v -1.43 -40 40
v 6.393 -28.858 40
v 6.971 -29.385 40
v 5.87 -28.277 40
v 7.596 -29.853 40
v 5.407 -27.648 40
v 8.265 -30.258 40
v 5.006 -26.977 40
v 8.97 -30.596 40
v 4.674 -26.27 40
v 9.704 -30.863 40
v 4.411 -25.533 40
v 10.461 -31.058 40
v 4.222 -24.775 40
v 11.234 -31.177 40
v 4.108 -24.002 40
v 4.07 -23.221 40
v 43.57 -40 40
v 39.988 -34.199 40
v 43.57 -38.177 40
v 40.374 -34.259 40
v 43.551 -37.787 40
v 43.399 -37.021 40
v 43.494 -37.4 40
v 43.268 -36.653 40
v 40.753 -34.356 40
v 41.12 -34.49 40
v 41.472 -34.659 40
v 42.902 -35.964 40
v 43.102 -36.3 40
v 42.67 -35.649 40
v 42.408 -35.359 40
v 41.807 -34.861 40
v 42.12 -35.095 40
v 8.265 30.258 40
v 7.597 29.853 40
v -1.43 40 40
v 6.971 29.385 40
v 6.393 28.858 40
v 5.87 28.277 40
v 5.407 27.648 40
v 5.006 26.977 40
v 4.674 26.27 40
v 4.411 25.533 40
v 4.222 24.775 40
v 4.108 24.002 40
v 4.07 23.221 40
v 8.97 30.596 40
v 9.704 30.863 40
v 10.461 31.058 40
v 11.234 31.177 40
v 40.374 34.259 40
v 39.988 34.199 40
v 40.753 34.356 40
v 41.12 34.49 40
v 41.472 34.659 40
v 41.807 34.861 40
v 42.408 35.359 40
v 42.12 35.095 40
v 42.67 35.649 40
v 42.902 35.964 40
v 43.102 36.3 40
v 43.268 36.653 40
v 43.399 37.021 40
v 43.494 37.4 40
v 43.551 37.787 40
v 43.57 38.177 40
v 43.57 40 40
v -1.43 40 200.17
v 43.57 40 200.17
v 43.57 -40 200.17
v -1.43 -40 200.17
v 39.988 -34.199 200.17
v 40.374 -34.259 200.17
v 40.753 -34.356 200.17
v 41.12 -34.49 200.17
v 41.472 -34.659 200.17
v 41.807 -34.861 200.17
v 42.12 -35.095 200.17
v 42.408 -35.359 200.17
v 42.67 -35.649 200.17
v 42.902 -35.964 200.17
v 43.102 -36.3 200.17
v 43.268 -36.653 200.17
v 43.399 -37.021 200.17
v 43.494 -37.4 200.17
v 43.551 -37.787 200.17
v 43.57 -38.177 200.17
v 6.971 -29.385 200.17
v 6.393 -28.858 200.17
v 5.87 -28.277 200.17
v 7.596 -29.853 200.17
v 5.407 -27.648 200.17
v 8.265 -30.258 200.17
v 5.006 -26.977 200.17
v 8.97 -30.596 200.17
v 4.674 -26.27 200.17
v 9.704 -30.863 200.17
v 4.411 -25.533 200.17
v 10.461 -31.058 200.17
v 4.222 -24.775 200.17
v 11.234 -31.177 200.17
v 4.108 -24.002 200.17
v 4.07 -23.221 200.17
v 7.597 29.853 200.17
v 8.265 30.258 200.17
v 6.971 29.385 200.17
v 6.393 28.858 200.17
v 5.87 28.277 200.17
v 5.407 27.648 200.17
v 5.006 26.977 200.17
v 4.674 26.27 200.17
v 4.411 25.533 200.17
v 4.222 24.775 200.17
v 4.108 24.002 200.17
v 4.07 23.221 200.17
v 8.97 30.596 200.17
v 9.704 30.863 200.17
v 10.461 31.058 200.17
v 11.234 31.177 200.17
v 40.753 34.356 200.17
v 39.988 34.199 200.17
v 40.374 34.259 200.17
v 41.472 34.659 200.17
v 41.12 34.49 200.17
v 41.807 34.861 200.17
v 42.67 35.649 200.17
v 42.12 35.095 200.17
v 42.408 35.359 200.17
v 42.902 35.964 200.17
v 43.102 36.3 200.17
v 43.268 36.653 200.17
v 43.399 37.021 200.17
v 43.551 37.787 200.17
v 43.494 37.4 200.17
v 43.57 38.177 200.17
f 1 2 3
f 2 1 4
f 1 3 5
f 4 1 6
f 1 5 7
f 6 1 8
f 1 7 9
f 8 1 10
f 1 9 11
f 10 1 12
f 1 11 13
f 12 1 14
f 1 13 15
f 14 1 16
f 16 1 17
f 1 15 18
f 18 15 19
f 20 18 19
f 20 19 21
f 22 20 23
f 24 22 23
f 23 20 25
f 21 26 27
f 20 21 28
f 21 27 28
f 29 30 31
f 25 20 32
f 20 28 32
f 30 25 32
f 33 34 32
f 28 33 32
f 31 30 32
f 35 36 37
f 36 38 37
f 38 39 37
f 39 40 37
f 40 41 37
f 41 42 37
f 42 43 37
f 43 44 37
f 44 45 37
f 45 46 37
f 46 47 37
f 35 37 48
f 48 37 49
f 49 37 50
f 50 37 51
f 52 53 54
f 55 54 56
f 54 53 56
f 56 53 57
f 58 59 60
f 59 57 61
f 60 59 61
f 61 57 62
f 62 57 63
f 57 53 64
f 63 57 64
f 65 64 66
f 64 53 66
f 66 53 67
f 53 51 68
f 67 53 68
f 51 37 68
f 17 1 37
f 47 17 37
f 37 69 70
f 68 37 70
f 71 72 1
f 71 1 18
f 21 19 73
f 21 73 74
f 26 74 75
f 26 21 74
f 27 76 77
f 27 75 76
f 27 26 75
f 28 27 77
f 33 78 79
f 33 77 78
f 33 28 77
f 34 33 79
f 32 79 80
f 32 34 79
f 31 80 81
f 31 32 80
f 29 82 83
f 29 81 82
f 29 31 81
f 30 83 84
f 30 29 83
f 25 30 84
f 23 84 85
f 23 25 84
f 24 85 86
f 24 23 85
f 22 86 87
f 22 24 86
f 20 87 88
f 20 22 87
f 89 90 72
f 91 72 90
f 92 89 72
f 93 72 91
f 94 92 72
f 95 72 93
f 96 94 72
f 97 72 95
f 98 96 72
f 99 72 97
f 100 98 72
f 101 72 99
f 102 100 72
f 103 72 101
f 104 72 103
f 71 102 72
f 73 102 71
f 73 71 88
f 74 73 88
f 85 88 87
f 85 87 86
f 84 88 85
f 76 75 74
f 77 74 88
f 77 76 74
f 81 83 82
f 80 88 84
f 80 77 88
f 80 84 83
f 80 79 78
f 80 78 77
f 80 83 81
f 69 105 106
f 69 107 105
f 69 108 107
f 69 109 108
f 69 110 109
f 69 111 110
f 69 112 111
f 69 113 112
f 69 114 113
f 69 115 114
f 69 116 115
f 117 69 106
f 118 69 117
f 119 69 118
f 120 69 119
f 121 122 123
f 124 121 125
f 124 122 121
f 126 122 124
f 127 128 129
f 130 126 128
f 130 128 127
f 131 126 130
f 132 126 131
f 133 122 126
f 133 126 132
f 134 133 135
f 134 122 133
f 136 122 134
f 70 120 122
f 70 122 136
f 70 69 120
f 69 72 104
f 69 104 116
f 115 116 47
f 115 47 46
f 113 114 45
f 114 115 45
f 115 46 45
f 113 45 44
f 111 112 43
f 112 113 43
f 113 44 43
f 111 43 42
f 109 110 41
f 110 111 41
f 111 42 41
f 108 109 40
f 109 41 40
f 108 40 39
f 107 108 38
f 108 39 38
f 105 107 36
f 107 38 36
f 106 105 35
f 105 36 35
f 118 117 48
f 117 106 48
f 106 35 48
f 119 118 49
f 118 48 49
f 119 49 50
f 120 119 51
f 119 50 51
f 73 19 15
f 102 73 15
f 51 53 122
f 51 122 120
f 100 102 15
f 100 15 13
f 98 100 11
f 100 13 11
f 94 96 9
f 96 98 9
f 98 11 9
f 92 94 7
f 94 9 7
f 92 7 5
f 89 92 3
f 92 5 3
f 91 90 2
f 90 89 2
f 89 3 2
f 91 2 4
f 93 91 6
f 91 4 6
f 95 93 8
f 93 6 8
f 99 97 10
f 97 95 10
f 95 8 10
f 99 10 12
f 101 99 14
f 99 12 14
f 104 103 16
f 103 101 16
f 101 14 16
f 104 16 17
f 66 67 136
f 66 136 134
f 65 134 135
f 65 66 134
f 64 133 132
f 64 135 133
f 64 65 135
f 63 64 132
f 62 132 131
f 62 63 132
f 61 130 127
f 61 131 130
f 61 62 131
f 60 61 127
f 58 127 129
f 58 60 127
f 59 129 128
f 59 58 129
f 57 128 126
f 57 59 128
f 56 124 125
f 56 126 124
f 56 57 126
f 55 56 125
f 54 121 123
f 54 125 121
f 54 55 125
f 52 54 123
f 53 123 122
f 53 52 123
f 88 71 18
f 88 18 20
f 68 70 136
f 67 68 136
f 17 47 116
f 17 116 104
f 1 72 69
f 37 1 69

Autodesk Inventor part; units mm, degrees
ref_plane "Начальная плоскость" through (0, 0, 40) normal (0, 0, 1) x (1, 0, 0)
ref_plane "Конечная плоскость" through (0, 0, 200.17) normal (0, 0, 1) x (1, 0, 0)
sketch "Эскиз" plane through (0, 0, 0) normal (0, 0, 1) x (1, 0, 0)
  line L0 (-1.43, 0) -> (-1.43, 40)
  line L1 (-1.43, 40) -> (43.57, 40)
  line L2 (43.57, 40) -> (43.57, 38.1774)
  line L3 (39.9881, 34.1993) -> (11.2338, 31.1771)
  line L4 (4.07, 23.221) -> (4.07, 0)
  line L5 (4.07, 0) -> (-1.43, 0) construction
  line L6 (23.82, 40) -> (23.82, 32.5) construction
  line L7 (43.57, 34.5758) -> (43.57, 32.5) construction
  line L8 (43.57, 32.5) -> (23.82, 32.5) construction
  line L9 (0, 15) -> (0, -27) construction
  line L10 (-5.539, 0) -> (16.0067, 0) construction
  line L11 (-1.43, 0) -> (-1.43, -40)
  line L12 (-1.43, -40) -> (43.57, -40)
  line L13 (43.57, -40) -> (43.57, -38.1774)
  line L14 (39.9881, -34.1993) -> (11.2338, -31.1771)
  line L15 (4.07, -23.221) -> (4.07, 0)
  arc A0 (11.2338, 31.1771) -> (4.07, 23.221) centre (12.07, 23.221) ccw
  arc A1 (4.07, -23.221) -> (11.2338, -31.1771) centre (12.07, -23.221) ccw
  arc A2 (39.9881, 34.1993) -> (43.57, 38.1774) centre (39.57, 38.1774) ccw
  arc A3 (43.57, -38.1774) -> (39.9881, -34.1993) centre (39.57, -38.1774) ccw
  line L16 (0, 56) -> (0, -56) construction
  line L17 (-15.5135, 0) -> (54.308, 0) construction
  point P0 (4.07, 30.4242)
  point P1 (43.57, -34.5758)
  point P2 (4.07, -30.4242)
  point P3 (23.82, -40)
  point P4 (23.82, -32.5)
  dimension "d0" = 5.5
  dimension "d1" = 40
  dimension "d2" = 45
  dimension "d3" = 7.5
  dimension "d4" = 19.75
  dimension "d5" = 2.0758
  dimension "d23" = 8
  dimension "d24" = 4
  dimension "d25" = 1.43
extrude "Тело" add sketch "Эскиз" along normal up to surface (160.17 mm away) from surface at 40
sketch "Sketch3" plane through (0, 0, 0) normal (0, 0, 1) x (1, 0, 0)
  line L0 (0, 0) -> (10, 0)
ref_plane "Work Plane3" through (0, 0, 0) normal (0, -1, 0) x (1, 0, 0)
sketch "Sketch4" plane through (0, 0, 0) normal (0, -1, 0) x (1, 0, 0)
  line L0 (-2, 40) -> (12, 40)
  line L1 (-2, 200.17) -> (12, 200.17)
  dimension "d29" = 160.17
ref_plane "РабПлоскость4" through (0, -158, 240.17) normal (0, 1, 0) x (1, 0, 0)
ref_plane "РабПлоскость5" through (0, 557.0652, 240.17) normal (0, 1, 0) x (1, 0, 0)
ref_plane "РабПлоскость6" through (0, 199.5326, 240.17) normal (0, 1, 0) x (1, 0, 0)
sketch "Эскиз5" plane through (0, 199.5326, 240.17) normal (0, 1, 0) x (1, 0, 0)
  line L0 (-1.43, 0) -> (-1.43, 40)
  line L1 (-1.43, 40) -> (43.57, 40)
  line L2 (43.57, 40) -> (43.57, 38.1774)
  arc A0 (39.9881, 34.1993) -> (43.57, 38.1774) centre (39.57, 38.1774) ccw
  line L3 (39.9881, 34.1993) -> (11.2338, 31.1771)
  arc A1 (11.2338, 31.1771) -> (4.07, 23.221) centre (12.07, 23.221) ccw
  line L4 (4.07, 23.221) -> (4.07, 0)
  line L5 (4.07, -23.221) -> (4.07, 0)
  arc A2 (4.07, -23.221) -> (11.2338, -31.1771) centre (12.07, -23.221) ccw
  line L6 (39.9881, -34.1993) -> (11.2338, -31.1771)
  arc A3 (43.57, -38.1774) -> (39.9881, -34.1993) centre (39.57, -38.1774) ccw
  line L7 (43.57, -40) -> (43.57, -38.1774)
  line L8 (-1.43, -40) -> (43.57, -40)
  line L9 (-1.43, 0) -> (-1.43, -40)
extrude "Выдавливание2" add sketch "Эскиз5" along normal up to surface (715.0652 mm away) from surface at -357.5326 separate body
feature "Комбинировать1" [suppressed]
ref_plane "РабПлоскость7" through (0, 562.5, 0) normal (0, -1, 0) x (1, 0, 0)
ref_plane "РабПлоскость8" through (0, -158, 0) normal (0, -1, 0) x (1, 0, 0)
ref_plane "РабПлоскость9" through (0, 202.25, 0) normal (0, -1, 0) x (1, 0, 0)
sketch "Эскиз6" plane through (0, 202.25, 0) normal (0, -1, 0) x (1, 0, 0)
  line L0 (-1.43, 0) -> (-1.43, 40)
  line L1 (-1.43, 40) -> (43.57, 40)
  line L2 (43.57, 40) -> (43.57, 38.1774)
  arc A0 (39.9881, 34.1993) -> (43.57, 38.1774) centre (39.57, 38.1774) ccw
  line L3 (39.9881, 34.1993) -> (11.2338, 31.1771)
  arc A1 (11.2338, 31.1771) -> (4.07, 23.221) centre (12.07, 23.221) ccw
  line L4 (4.07, 23.221) -> (4.07, 0)
  line L5 (4.07, -23.221) -> (4.07, 0)
  arc A2 (4.07, -23.221) -> (11.2338, -31.1771) centre (12.07, -23.221) ccw
  line L6 (39.9881, -34.1993) -> (11.2338, -31.1771)
  arc A3 (43.57, -38.1774) -> (39.9881, -34.1993) centre (39.57, -38.1774) ccw
  line L7 (43.57, -40) -> (43.57, -38.1774)
  line L8 (-1.43, -40) -> (43.57, -40)
  line L9 (-1.43, 0) -> (-1.43, -40)
extrude "Выдавливание3" add sketch "Эскиз6" along normal up to surface (720.5 mm away) from surface at -360.25 separate body
feature "Комбинировать2" [suppressed]
ref_plane "РабПлоскость10" through (-1.43, -158, 200.17) normal (0, 0, 1) x (1, 0, 0)
split "Разделение1" plane through (-1.43, -158, 200.17) removes the side toward (0, 0, 1)
ref_plane "РабПлоскость11" through (-1.43, 562.5, 40) normal (0, 0, -1) x (-1, 0, 0)
split "Разделение2" plane through (-1.43, 562.5, 40) removes the side toward (0, 0, -1)
equation "\"d0\" = G_T"
equation "\"d1\" = 0.5 * G_H"
equation "\"d2\" = G_W"
equation "\"d3\" = G_T1"
equation "\"d4\" = G_C"
equation "\"d23\" = G_IR"
equation "\"d24\" = G_ER"
equation "\"d25\" = ex"
equation "\"d6\" = G_L"
equation "\"G_W\" = 45"
equation "\"G_T\" = 5.5"
equation "\"G_T1\" = 7.5"
equation "\"G_NG\" = 0.105104"
equation "\"G_ER\" = 4"
equation "\"G_IR\" = 8"
equation "\"G_C\" = 19.75"
equation "\"G_L\" = d29"
equation "\"ex\" = 1.43"
equation "\"d27\" = G_OFFSET_END + B_L"
equation "\"B_L\" = 240.17"
equation "\"G_H\" = 80"
equation "\"G_OFFSET_END\" = -40"
properties part number "ISO 657/11 - CH 80 x 8 - 160,17" material "Сталь, мягкая"
